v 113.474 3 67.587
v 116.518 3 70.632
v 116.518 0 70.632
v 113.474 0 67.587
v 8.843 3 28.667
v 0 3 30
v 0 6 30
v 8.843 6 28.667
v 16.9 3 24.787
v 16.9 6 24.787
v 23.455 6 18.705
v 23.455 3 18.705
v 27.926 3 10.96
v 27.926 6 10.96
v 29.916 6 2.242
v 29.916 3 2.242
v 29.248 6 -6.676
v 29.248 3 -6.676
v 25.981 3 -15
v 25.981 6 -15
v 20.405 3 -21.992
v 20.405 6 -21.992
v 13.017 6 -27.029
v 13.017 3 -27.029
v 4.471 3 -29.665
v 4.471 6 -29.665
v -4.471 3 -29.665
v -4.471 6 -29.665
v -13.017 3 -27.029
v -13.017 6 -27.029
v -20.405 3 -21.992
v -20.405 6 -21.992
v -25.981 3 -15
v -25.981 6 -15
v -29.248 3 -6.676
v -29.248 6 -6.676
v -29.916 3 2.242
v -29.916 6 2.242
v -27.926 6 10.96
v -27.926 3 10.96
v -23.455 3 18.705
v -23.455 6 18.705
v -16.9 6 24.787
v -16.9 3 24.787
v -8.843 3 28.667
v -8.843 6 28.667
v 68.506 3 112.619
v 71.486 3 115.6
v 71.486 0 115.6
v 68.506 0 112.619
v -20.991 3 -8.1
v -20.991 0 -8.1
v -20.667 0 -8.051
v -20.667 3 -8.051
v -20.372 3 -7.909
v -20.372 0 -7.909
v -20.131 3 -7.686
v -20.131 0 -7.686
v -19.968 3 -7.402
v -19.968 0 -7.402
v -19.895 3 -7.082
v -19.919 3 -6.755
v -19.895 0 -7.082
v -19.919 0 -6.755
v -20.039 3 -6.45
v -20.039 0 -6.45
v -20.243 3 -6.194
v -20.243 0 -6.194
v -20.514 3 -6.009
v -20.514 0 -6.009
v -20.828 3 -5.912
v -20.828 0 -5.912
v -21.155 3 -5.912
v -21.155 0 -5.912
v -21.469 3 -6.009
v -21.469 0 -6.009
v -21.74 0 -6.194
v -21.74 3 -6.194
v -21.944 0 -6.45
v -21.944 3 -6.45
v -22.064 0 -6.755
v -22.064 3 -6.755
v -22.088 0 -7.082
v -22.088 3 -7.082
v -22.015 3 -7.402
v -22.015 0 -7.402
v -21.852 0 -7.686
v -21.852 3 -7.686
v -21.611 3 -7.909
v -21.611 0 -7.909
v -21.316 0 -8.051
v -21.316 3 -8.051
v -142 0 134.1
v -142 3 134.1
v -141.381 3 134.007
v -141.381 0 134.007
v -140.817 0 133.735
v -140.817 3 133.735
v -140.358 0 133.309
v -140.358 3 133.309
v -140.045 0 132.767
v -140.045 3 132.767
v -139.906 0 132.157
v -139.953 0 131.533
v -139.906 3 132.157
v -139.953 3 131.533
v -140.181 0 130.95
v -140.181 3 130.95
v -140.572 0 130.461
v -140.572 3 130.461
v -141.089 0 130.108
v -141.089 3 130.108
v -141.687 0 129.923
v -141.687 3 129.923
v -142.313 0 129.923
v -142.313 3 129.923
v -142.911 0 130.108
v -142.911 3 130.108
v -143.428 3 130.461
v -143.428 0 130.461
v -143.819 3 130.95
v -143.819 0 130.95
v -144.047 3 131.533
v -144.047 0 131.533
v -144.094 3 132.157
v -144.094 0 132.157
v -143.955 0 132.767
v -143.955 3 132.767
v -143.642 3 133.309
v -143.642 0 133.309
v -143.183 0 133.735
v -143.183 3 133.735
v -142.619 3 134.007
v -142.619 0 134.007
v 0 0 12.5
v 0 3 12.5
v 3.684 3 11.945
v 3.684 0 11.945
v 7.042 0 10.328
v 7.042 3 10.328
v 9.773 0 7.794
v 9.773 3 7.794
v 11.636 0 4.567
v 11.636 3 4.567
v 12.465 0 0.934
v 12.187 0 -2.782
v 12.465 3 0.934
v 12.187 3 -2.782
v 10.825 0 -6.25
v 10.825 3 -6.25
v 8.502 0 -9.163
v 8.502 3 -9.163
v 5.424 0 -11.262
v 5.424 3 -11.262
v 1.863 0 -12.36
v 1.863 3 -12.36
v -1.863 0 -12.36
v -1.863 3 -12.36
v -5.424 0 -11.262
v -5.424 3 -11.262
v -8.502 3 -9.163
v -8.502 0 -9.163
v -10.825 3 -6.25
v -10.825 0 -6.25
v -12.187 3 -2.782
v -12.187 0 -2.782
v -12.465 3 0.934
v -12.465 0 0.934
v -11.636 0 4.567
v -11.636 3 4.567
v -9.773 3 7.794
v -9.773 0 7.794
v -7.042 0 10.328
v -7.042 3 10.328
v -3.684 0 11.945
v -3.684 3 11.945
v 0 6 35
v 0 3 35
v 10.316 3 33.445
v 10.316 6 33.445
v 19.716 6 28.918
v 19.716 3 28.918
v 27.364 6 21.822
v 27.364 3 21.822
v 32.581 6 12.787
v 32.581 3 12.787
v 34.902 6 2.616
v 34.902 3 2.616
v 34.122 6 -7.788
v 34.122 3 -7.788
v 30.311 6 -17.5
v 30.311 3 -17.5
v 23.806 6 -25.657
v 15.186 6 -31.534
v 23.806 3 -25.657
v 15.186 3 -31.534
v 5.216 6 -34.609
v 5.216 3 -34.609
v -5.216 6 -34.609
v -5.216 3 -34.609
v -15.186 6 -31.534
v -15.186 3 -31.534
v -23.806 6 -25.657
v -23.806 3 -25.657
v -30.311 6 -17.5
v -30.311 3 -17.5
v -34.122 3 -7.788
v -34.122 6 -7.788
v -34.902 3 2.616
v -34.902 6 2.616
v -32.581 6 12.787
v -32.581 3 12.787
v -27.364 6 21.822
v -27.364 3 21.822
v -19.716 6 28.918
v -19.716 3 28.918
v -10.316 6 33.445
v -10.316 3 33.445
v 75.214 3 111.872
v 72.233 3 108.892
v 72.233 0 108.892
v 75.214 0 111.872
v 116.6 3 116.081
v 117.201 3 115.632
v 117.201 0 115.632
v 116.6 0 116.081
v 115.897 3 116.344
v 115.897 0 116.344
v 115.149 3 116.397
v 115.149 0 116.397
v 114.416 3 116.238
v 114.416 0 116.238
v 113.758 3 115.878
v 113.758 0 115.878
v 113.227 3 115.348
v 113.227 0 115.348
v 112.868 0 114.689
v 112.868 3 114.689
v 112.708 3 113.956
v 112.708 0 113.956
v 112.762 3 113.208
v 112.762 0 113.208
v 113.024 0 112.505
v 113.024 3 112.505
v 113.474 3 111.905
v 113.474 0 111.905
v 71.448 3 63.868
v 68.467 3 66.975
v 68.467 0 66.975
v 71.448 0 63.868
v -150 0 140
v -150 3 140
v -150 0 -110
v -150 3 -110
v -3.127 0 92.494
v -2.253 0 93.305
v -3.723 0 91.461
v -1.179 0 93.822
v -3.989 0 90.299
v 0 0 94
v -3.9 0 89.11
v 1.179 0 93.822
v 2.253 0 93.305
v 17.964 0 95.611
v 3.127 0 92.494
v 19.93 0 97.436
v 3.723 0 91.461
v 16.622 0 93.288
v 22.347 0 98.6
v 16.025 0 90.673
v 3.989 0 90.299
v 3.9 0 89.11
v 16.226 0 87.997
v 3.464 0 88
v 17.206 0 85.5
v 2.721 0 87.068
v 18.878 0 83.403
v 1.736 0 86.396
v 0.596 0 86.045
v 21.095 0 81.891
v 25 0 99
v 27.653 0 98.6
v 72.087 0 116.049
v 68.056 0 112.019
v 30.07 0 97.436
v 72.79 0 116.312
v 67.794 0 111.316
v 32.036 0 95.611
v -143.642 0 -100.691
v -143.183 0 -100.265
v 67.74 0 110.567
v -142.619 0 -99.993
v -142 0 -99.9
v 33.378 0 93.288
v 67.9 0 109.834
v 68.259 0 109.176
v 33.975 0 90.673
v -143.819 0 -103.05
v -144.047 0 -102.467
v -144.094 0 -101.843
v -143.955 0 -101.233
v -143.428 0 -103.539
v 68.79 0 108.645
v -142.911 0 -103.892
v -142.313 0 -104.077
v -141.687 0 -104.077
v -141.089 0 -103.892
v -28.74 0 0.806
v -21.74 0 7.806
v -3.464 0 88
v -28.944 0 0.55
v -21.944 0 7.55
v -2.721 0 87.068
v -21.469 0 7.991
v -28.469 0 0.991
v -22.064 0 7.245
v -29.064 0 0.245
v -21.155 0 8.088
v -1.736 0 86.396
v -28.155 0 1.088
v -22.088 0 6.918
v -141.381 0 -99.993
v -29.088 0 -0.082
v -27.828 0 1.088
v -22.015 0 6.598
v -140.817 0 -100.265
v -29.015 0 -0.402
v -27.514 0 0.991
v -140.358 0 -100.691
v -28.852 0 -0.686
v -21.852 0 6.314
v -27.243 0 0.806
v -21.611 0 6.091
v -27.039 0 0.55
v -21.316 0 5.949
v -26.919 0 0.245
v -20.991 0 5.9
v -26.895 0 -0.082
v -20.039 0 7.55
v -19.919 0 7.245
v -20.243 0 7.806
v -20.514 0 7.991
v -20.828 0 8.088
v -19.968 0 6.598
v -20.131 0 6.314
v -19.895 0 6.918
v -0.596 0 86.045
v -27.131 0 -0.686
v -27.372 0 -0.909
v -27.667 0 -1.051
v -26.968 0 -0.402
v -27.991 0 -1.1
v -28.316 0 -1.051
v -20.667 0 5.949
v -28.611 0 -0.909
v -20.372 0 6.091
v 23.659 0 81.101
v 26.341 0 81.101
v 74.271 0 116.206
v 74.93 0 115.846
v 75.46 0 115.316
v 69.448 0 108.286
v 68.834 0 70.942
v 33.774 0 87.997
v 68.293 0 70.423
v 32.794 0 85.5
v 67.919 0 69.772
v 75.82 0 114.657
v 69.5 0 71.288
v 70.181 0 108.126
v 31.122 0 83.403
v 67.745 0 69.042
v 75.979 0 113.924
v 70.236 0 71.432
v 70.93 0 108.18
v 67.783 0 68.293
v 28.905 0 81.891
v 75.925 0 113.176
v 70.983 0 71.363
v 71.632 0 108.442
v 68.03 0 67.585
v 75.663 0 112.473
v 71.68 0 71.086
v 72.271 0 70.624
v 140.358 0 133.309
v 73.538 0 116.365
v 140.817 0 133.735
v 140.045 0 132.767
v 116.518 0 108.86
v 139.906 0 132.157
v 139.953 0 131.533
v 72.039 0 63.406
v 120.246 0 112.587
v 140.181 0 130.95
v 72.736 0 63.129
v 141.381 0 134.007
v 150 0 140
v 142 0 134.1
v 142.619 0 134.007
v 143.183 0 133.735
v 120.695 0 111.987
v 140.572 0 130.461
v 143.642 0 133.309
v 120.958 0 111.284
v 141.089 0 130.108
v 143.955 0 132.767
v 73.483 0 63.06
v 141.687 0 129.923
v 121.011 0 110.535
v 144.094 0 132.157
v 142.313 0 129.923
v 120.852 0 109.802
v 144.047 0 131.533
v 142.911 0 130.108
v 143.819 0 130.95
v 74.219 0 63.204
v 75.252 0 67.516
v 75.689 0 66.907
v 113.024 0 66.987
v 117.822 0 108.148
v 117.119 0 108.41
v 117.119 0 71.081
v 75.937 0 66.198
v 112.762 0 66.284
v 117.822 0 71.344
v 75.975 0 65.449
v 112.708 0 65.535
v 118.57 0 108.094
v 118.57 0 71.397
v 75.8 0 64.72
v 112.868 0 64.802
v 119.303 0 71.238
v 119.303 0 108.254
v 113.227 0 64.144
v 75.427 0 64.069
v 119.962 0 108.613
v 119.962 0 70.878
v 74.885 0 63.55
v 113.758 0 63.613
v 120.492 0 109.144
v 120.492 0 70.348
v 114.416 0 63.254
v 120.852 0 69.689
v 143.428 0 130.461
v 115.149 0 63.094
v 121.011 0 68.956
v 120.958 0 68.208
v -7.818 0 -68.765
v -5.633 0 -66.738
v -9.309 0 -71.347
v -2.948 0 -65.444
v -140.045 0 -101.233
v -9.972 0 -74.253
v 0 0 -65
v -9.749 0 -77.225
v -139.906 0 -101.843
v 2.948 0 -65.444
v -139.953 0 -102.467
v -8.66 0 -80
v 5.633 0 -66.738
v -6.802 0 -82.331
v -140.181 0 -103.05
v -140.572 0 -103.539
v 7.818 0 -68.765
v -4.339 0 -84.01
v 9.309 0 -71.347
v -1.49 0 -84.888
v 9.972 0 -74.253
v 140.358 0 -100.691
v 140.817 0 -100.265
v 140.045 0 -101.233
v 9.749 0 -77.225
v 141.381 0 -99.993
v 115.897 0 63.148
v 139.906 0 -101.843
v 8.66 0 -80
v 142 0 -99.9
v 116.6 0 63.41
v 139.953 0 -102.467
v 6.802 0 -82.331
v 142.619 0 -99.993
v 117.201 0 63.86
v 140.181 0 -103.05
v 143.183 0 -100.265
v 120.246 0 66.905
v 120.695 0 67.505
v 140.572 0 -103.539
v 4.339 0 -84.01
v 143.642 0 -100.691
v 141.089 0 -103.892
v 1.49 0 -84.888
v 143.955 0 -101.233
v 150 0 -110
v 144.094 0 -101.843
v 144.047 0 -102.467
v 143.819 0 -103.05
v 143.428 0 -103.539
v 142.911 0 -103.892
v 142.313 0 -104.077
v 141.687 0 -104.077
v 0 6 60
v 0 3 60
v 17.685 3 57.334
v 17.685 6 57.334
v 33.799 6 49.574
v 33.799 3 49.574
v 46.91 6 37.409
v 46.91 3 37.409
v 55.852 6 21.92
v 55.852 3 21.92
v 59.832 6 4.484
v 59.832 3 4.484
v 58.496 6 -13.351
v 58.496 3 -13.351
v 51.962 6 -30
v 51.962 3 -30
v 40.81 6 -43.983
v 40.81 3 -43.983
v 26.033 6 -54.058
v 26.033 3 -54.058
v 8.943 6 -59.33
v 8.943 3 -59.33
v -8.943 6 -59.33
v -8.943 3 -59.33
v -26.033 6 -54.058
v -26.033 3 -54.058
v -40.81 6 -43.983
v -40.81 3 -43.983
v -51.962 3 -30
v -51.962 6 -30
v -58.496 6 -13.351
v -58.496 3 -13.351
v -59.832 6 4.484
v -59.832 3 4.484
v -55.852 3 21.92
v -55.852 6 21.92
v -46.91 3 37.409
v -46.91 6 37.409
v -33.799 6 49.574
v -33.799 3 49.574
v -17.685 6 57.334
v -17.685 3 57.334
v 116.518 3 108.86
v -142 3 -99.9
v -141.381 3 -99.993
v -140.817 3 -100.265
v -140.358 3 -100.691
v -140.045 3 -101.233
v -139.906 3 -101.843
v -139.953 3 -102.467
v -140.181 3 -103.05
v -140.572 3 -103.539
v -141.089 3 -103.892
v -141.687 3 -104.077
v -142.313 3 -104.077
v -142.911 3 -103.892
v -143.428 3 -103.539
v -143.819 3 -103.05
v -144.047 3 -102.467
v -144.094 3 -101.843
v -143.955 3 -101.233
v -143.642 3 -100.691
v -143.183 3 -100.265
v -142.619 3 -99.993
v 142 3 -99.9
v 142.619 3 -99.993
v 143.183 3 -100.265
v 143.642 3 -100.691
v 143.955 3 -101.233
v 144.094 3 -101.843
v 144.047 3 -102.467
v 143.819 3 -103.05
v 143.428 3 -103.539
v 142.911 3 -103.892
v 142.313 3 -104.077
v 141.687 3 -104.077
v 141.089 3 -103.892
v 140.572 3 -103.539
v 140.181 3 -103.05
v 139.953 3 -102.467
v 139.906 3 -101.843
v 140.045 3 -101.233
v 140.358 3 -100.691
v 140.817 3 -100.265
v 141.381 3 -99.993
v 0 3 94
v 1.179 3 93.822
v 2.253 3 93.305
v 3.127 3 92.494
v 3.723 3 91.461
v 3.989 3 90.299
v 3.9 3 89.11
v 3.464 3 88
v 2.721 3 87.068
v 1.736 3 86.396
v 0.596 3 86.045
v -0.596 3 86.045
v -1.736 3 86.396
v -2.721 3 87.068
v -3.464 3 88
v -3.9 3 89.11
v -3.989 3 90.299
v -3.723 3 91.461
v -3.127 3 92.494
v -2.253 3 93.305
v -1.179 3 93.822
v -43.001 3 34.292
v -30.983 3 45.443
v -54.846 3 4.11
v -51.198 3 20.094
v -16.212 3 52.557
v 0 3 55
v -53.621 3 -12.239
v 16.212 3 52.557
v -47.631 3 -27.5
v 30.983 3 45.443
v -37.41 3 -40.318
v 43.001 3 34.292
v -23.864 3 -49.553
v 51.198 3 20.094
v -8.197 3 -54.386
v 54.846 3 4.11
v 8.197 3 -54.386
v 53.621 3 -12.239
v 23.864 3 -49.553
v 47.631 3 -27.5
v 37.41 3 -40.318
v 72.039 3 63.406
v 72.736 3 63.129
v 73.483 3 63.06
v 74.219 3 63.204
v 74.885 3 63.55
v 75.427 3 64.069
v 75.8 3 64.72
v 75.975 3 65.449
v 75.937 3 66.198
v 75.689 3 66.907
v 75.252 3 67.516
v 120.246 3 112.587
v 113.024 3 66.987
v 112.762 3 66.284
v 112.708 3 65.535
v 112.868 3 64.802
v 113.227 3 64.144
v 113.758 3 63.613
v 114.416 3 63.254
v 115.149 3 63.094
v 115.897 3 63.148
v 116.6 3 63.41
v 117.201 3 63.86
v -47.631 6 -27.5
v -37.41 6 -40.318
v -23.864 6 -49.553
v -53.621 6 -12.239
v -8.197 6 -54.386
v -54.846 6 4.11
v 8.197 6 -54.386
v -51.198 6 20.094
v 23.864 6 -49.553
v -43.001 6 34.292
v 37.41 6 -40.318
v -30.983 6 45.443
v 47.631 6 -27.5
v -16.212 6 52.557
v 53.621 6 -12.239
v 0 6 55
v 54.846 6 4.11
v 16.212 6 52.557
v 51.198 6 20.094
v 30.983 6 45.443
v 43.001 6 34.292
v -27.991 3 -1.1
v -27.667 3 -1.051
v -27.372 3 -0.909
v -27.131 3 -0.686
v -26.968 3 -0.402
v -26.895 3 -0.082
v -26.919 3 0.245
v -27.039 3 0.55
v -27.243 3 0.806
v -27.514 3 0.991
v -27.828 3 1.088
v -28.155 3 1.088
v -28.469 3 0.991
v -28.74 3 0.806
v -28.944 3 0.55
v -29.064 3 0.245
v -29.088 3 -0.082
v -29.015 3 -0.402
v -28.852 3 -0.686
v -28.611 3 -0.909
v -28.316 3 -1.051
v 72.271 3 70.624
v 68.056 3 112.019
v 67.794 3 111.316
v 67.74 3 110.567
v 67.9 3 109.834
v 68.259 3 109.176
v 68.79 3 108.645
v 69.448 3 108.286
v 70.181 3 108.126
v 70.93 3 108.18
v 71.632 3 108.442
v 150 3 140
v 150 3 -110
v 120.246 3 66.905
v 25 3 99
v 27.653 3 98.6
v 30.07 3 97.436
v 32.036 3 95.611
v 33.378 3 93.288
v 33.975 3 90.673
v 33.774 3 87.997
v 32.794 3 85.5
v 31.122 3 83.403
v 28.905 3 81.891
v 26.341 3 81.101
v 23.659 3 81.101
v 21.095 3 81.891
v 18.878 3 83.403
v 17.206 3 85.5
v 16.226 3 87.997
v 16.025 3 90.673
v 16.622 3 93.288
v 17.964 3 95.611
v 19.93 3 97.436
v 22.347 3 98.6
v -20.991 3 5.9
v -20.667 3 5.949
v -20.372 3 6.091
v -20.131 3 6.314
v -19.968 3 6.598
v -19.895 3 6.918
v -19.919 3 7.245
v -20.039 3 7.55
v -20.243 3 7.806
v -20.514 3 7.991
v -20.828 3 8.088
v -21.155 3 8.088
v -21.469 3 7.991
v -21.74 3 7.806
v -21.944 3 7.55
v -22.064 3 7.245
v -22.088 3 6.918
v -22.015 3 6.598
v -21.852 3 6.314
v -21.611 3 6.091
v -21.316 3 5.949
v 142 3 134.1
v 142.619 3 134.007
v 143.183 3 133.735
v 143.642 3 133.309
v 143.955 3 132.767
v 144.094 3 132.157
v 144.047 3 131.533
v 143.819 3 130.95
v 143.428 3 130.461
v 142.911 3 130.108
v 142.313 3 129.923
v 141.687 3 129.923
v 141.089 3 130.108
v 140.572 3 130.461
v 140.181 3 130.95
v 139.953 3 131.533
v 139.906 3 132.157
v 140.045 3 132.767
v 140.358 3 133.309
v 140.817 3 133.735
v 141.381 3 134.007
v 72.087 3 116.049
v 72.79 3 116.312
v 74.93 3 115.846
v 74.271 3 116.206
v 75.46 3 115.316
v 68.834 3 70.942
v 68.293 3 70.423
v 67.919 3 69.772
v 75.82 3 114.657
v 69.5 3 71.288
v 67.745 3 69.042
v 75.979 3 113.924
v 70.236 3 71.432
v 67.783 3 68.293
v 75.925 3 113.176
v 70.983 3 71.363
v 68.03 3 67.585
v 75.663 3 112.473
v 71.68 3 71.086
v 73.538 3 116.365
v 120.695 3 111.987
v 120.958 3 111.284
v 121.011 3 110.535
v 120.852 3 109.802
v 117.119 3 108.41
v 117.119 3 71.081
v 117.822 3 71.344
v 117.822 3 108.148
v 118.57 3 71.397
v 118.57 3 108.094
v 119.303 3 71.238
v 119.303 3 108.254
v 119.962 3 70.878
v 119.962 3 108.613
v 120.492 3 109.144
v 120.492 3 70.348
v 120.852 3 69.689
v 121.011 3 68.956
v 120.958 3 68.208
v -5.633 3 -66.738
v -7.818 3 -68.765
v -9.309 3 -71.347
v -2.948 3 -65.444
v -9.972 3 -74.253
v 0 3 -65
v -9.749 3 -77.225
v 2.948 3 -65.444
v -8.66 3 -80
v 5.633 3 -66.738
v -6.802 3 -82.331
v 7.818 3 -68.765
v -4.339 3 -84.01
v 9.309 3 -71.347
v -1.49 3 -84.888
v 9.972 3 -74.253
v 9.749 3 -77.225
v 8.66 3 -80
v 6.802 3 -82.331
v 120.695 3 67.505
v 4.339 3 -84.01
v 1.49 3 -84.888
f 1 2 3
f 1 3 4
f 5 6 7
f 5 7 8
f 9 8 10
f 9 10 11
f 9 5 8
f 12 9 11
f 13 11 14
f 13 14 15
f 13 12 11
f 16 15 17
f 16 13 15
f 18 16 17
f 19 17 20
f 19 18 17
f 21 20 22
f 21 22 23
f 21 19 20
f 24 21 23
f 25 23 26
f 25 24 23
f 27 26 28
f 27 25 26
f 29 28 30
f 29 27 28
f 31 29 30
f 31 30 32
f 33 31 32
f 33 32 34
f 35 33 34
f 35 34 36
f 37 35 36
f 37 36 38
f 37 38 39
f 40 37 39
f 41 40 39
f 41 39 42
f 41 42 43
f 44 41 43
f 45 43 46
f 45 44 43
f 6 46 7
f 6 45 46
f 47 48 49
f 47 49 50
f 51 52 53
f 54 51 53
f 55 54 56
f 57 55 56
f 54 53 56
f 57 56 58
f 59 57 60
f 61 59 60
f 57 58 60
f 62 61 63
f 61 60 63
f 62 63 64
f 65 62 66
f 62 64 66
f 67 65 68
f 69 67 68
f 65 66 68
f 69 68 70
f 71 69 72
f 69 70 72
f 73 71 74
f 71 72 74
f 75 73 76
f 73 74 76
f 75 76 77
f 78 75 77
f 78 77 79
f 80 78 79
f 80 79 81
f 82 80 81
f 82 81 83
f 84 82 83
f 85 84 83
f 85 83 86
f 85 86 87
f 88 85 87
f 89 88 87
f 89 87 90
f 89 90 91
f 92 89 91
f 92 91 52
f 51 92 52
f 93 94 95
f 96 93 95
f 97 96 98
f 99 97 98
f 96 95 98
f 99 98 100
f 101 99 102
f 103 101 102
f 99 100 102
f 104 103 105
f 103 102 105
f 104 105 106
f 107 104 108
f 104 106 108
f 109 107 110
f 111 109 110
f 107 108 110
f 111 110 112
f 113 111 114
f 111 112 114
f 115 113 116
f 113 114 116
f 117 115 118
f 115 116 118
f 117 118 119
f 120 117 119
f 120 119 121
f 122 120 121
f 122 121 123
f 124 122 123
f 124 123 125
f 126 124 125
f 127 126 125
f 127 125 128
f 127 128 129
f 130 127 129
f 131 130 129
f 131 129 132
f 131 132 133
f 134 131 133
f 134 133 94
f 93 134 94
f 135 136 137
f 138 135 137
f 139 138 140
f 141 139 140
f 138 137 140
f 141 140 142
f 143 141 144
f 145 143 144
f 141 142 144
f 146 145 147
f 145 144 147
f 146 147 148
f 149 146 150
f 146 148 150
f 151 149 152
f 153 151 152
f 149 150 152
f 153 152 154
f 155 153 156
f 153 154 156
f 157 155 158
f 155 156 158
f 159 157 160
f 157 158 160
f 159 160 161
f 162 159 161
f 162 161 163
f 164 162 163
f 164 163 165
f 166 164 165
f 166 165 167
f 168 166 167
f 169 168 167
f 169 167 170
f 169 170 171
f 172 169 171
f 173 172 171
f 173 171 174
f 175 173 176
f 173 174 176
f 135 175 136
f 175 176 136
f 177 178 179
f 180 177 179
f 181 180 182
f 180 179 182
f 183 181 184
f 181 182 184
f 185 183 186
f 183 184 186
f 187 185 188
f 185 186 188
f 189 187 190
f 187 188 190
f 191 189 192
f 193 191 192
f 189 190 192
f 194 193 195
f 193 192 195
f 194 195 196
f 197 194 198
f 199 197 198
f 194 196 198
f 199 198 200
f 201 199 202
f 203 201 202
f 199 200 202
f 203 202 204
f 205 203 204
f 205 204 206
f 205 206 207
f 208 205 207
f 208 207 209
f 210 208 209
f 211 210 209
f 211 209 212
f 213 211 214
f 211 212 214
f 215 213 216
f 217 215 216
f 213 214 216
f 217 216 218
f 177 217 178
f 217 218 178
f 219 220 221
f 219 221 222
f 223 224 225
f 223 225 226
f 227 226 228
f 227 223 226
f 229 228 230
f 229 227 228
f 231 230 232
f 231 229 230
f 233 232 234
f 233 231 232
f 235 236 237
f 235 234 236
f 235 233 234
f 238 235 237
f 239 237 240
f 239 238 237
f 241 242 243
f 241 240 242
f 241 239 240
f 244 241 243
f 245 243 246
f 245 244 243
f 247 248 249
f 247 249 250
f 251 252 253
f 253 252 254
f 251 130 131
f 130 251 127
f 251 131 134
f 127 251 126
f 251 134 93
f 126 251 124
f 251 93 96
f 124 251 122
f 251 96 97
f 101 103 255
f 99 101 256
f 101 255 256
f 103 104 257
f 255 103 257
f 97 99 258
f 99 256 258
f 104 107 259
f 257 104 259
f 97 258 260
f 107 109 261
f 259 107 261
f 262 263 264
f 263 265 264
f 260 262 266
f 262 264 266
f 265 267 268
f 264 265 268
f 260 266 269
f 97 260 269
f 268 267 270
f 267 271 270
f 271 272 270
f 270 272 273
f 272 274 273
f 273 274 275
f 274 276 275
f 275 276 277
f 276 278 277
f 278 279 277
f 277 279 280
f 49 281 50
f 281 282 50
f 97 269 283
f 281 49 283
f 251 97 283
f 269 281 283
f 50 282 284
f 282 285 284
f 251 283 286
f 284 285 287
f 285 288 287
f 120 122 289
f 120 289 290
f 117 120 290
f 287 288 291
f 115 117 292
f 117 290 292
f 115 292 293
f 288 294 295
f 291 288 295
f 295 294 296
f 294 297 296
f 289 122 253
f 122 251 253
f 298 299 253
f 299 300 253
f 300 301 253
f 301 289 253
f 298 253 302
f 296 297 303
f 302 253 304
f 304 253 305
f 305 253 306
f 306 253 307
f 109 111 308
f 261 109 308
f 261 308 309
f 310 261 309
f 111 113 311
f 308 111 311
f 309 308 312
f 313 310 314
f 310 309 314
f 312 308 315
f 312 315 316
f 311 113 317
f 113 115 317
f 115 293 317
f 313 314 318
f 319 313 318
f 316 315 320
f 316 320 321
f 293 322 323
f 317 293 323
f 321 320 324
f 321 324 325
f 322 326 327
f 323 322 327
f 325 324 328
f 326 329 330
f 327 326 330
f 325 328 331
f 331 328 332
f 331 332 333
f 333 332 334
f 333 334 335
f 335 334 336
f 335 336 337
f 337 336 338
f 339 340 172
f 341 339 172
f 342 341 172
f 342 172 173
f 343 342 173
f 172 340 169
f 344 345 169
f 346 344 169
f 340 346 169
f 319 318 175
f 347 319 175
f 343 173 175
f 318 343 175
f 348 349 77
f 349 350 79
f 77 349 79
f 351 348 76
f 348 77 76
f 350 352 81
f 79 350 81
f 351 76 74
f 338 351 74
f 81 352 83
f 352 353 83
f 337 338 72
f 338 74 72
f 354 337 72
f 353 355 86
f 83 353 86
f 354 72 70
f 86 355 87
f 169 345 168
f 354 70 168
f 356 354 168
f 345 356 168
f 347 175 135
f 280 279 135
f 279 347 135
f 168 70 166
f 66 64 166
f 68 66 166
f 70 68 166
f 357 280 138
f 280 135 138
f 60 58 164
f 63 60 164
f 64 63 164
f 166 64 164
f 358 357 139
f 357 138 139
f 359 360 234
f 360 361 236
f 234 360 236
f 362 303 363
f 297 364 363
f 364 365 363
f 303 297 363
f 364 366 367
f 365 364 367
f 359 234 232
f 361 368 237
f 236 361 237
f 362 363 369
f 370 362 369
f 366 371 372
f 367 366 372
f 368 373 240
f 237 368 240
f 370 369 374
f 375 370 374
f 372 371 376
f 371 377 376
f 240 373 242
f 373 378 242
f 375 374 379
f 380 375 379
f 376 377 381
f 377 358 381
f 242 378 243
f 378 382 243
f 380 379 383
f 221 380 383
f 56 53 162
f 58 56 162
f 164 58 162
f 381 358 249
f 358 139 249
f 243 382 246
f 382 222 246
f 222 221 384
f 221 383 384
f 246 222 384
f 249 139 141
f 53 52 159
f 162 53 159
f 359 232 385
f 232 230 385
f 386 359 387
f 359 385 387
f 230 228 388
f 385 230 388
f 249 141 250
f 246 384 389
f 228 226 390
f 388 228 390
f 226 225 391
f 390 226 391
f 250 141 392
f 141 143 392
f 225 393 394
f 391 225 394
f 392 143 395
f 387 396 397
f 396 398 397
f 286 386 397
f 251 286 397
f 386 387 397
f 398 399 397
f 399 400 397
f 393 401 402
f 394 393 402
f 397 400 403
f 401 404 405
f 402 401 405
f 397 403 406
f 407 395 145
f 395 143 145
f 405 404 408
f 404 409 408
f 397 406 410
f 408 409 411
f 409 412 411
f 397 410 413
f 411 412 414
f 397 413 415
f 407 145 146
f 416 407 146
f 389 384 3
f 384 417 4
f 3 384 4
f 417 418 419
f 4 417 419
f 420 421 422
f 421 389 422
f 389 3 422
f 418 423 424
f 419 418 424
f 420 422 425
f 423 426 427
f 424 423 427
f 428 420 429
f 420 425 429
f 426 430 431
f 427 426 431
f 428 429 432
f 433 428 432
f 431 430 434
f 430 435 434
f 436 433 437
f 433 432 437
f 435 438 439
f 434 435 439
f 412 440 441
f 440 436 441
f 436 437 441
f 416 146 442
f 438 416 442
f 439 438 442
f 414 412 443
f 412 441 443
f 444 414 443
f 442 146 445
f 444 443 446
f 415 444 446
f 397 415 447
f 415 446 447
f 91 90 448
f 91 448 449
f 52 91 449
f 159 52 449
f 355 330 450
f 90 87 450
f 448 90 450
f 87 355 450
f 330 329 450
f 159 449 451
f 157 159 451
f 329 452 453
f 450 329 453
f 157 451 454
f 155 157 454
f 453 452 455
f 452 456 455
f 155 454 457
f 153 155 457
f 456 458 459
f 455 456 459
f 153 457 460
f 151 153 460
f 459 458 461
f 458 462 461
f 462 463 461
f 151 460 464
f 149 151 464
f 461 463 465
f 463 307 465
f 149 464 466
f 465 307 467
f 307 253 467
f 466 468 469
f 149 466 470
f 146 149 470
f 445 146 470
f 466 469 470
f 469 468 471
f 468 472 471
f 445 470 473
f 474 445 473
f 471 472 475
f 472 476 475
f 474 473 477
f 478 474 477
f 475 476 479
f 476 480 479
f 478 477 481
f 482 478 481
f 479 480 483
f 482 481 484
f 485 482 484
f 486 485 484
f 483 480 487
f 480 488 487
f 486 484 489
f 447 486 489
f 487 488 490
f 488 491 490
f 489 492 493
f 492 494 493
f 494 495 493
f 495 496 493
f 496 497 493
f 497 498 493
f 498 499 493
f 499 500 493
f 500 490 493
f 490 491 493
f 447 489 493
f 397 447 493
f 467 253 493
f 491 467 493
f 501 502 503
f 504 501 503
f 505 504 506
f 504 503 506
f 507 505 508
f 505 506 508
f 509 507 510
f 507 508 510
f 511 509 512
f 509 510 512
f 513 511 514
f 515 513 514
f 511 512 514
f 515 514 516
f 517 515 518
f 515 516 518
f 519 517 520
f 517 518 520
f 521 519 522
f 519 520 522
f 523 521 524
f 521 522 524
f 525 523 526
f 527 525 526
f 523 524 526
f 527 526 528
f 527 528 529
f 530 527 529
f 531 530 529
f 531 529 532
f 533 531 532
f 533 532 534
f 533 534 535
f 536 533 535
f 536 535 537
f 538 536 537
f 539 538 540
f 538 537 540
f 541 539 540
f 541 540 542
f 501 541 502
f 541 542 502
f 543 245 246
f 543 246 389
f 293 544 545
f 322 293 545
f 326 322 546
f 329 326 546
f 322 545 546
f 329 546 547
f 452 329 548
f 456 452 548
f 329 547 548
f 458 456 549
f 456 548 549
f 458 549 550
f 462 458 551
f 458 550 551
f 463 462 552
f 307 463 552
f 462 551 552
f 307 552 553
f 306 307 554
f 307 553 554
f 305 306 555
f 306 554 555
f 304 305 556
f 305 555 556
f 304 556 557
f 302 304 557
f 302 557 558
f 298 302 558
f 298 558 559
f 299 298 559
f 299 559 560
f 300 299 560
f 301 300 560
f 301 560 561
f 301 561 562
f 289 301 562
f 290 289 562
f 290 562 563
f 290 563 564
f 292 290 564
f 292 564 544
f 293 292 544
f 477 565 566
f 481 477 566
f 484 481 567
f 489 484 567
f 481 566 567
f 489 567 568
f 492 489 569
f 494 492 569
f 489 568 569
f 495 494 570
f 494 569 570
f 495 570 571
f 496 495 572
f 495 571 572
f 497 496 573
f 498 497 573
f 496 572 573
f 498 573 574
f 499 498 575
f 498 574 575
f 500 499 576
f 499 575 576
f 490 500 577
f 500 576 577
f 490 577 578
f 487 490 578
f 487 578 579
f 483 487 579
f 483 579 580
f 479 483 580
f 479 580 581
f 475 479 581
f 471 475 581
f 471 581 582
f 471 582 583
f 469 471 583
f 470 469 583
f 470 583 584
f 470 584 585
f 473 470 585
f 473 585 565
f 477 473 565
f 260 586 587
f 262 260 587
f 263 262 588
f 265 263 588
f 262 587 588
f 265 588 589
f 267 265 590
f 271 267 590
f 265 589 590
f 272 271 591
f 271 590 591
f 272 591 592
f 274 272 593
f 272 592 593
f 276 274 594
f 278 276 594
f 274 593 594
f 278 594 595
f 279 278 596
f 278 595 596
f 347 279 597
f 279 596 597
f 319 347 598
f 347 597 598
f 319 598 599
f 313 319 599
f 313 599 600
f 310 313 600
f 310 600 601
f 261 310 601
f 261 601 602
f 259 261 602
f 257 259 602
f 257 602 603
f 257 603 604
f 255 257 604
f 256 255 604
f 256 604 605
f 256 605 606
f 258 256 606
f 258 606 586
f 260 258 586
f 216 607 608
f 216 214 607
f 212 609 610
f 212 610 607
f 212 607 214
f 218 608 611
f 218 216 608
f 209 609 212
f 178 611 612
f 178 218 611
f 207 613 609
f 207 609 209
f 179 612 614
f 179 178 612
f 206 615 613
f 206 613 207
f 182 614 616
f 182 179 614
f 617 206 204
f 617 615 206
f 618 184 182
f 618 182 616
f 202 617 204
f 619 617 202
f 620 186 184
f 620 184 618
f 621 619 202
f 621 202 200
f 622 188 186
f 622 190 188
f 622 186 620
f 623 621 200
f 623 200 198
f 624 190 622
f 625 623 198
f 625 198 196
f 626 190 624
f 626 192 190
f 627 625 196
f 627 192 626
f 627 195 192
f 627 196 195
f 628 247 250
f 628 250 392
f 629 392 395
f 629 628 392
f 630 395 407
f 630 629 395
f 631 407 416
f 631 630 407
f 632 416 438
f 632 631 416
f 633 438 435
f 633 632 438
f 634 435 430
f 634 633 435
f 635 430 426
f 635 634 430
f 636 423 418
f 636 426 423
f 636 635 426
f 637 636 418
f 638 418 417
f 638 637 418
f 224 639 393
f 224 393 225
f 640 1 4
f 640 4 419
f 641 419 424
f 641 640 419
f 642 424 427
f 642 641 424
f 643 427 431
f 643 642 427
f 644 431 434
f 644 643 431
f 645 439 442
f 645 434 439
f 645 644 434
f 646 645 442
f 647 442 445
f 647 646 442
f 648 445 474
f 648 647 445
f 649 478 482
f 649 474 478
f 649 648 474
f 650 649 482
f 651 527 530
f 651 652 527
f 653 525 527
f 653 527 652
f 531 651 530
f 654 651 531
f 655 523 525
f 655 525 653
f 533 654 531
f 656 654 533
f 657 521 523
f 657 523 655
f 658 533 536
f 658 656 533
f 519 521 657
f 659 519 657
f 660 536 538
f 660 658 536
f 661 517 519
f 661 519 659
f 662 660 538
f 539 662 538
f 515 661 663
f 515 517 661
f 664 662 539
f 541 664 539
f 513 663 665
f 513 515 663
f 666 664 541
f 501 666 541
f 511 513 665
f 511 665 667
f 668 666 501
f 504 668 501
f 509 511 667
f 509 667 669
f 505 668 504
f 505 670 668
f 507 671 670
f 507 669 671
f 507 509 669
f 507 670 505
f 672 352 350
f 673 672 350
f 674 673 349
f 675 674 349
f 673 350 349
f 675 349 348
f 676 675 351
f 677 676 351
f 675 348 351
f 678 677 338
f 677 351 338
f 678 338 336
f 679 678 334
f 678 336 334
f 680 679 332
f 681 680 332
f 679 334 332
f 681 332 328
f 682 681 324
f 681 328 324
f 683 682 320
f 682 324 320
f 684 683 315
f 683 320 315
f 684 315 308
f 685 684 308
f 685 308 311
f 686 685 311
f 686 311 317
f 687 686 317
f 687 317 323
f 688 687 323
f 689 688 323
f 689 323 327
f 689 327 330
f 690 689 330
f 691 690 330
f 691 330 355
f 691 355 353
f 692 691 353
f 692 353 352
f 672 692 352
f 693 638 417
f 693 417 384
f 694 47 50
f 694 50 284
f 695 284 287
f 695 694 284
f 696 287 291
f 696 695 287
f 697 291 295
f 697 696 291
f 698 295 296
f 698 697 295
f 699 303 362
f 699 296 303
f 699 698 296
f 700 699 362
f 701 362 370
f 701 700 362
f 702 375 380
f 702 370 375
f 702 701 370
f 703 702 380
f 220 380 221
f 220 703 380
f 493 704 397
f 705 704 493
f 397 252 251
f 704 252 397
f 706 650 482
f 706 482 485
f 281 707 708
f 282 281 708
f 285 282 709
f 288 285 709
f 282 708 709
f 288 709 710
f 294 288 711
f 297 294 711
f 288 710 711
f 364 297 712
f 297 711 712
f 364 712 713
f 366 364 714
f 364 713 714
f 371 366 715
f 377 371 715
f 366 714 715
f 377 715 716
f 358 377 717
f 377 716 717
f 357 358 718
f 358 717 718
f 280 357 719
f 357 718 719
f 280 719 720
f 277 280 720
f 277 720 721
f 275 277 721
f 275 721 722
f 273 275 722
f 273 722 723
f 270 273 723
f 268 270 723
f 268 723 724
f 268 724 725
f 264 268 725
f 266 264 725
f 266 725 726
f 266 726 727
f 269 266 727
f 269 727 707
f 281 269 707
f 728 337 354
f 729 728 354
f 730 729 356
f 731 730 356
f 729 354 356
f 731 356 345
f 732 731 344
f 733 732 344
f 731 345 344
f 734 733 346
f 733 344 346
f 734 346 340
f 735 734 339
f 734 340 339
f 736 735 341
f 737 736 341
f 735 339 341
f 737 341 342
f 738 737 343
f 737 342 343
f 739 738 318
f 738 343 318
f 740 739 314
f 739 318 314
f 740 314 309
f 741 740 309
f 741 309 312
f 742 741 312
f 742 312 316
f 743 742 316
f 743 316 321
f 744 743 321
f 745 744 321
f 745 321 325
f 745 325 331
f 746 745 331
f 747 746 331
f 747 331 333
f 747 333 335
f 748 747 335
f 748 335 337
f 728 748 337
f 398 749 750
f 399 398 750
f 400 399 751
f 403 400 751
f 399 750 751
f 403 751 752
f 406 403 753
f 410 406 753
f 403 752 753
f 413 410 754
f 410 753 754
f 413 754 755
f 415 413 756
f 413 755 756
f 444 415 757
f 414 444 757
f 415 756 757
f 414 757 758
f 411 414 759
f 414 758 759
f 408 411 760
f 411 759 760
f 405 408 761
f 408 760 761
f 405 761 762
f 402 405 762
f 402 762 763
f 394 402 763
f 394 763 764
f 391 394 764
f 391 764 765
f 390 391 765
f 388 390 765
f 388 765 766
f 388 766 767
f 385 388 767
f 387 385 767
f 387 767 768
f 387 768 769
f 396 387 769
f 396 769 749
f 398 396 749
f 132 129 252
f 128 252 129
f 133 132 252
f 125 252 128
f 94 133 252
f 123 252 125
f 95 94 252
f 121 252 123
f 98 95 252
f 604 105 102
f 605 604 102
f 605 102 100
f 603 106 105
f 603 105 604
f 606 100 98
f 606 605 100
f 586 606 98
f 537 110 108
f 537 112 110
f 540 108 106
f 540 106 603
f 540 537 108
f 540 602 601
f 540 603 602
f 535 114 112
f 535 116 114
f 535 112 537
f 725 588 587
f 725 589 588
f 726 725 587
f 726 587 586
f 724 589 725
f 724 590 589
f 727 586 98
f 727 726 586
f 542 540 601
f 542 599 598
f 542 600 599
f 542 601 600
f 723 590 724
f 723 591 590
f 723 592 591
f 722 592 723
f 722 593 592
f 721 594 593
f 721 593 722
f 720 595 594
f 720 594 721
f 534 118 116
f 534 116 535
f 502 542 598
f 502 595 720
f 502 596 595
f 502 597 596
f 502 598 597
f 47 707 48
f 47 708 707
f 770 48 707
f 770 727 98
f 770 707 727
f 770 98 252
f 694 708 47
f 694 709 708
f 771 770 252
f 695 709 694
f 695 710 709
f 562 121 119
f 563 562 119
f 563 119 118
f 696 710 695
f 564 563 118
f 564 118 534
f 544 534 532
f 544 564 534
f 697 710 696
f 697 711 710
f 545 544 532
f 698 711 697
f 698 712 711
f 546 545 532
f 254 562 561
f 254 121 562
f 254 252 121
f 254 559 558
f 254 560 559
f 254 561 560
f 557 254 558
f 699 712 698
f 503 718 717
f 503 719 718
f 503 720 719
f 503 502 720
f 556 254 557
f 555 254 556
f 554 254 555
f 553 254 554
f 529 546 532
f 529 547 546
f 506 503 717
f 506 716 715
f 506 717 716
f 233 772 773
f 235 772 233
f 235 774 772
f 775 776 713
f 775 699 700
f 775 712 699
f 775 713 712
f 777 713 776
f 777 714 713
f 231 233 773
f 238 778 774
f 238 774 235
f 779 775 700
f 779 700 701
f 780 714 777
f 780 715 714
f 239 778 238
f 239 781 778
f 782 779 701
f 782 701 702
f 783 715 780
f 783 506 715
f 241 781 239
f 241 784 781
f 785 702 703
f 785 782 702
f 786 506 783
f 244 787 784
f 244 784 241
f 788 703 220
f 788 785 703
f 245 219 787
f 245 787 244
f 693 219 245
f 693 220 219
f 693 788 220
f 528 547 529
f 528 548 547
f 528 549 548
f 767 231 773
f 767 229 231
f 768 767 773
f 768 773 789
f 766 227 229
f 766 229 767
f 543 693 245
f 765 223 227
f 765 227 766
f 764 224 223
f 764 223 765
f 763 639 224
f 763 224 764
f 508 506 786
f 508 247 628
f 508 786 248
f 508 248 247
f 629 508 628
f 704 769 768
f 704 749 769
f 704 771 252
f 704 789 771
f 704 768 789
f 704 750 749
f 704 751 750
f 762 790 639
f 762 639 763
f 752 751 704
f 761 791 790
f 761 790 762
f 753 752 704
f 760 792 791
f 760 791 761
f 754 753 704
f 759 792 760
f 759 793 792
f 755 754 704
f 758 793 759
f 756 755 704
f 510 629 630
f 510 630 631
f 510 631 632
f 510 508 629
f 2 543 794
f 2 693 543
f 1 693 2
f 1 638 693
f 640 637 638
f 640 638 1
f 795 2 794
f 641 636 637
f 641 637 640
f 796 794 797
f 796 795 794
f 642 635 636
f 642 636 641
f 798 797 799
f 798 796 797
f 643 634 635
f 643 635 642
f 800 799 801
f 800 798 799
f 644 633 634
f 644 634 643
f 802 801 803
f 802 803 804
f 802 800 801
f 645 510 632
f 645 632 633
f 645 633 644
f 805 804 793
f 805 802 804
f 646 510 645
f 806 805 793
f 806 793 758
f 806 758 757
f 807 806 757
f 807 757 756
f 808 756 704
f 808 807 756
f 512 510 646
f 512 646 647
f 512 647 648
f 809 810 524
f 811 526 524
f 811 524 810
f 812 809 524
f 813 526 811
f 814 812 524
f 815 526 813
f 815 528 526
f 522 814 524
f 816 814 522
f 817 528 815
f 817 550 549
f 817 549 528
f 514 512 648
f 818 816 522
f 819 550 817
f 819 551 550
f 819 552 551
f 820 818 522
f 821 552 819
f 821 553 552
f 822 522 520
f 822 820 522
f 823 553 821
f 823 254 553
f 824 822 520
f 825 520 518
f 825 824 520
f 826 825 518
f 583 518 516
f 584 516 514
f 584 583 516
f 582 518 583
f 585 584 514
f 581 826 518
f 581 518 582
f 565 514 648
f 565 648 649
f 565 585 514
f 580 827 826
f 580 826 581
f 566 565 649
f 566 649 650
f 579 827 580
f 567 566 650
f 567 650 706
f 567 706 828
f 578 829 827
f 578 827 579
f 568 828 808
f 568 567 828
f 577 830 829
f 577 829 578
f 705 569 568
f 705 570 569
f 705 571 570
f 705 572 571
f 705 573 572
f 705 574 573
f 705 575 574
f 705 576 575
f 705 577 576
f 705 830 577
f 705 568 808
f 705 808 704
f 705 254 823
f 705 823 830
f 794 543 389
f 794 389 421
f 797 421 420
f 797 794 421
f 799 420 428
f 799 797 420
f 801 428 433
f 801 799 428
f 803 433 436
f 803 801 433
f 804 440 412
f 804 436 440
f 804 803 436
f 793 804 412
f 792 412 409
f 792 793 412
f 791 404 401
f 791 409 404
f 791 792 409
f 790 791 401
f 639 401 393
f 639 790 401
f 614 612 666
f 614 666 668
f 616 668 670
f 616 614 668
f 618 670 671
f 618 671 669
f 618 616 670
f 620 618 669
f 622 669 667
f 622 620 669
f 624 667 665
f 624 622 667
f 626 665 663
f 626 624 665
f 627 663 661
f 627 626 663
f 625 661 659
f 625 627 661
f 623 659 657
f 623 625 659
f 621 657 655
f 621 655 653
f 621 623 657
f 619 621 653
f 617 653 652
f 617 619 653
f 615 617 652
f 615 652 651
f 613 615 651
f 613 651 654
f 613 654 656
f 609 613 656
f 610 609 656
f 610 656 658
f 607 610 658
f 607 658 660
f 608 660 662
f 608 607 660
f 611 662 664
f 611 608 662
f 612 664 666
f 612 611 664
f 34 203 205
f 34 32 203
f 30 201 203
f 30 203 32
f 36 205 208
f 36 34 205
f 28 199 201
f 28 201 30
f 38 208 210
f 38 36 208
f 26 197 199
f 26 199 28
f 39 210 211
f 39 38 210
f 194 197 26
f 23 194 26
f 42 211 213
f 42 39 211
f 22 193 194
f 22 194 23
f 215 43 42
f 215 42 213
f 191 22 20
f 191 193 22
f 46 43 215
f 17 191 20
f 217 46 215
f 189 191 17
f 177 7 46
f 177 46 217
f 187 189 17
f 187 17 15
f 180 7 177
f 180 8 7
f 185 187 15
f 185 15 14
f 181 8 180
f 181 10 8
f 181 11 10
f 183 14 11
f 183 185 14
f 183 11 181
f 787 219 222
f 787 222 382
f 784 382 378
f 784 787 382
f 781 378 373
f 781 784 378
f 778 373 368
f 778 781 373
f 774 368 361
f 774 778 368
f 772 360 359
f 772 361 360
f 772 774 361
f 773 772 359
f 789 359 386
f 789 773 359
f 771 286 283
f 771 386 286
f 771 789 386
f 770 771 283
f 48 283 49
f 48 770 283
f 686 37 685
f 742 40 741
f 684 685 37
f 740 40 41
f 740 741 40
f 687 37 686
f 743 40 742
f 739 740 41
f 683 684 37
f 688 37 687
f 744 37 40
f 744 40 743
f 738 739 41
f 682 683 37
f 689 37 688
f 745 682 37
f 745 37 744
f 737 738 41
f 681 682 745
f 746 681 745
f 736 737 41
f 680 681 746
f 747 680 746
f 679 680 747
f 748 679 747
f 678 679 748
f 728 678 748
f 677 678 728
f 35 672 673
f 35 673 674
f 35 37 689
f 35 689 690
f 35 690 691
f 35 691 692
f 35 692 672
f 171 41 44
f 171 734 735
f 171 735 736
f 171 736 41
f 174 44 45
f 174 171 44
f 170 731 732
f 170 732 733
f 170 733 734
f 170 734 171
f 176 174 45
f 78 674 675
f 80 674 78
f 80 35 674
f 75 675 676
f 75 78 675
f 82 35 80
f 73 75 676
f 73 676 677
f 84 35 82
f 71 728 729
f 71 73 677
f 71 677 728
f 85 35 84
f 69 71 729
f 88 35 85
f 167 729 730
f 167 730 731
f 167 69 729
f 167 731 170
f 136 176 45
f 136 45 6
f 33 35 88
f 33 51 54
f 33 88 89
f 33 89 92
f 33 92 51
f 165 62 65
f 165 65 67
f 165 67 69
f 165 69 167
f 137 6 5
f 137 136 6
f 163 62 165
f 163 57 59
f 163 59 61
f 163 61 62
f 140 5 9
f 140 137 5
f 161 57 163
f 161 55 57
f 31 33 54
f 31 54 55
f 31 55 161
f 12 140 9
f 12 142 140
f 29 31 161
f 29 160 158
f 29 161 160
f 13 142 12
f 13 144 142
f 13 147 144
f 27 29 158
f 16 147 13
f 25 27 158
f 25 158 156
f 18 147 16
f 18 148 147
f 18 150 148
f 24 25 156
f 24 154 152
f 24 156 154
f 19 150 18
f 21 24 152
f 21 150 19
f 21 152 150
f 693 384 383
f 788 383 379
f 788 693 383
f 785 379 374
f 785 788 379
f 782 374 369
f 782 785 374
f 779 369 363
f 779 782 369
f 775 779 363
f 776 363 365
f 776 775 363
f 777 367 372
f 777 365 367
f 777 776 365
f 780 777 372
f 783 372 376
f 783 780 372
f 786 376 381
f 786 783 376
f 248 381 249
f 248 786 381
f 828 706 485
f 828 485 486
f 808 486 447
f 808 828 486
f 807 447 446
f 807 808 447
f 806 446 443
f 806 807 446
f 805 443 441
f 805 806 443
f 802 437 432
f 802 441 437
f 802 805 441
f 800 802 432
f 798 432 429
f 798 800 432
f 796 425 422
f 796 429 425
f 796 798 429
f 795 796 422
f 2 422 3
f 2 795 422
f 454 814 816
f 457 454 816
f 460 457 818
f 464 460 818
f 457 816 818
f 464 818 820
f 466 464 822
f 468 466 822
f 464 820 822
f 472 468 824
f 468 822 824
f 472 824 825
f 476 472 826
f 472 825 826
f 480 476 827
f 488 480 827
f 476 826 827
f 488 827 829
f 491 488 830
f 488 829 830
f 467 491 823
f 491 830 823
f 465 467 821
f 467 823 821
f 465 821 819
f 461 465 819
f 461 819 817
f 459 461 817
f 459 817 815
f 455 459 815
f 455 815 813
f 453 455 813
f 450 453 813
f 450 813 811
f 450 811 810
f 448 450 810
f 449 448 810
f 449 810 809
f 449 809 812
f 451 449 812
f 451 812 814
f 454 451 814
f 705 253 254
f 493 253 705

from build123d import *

# Parameters (mm, degrees)
SKETCH1_W           = 300
SKETCH1_H           = 220
BOSS_EXTRUDE1_DEPTH = 3
SKETCH2_R           = 12.5
CUT_EXTRUDE1_DEPTH  = 3
SKETCH3_R           = 60
SKETCH3_R_2         = 55
SKETCH3_R_3         = 35
SKETCH3_R_4         = 30
BOSS_EXTRUDE2_DEPTH = 3
CUT_EXTRUDE2_REACH  = 188.107
SKETCH4_R           = 1.1
CUT_EXTRUDE3_REACH  = 188.035
SKETCH5_R           = 10
SKETCH6_W           = 300
SKETCH6_H           = 30
BOSS_EXTRUDE3_DEPTH = 3
CUT_EXTRUDE4_REACH  = 207.205
SKETCH7_R           = 2.1
CUT_EXTRUDE5_REACH  = 207.205
CUT_EXTRUDE6_REACH  = 207.205
SKETCH10_R          = 4
SKETCH10_R_2        = 9


with BuildPart() as part:
    # Sketch1 → Boss-Extrude1 (new body)
    with BuildSketch(Plane(origin=(0, 0, 0), x_dir=(1, 0, 0), z_dir=(0, 1, 0))):
        Rectangle(SKETCH1_W, SKETCH1_H)
    extrude(amount=BOSS_EXTRUDE1_DEPTH)

    # Sketch2 → Cut-Extrude1 (cut)
    with BuildSketch(Plane(origin=(0, 3, 0), x_dir=(1, 0, 0), z_dir=(0, 1, 0))):
        with Locations(Location((0, 0, 0), (0, 0, 270))):
            Circle(SKETCH2_R)
    extrude(amount=-CUT_EXTRUDE1_DEPTH, mode=Mode.SUBTRACT)

    # Sketch3 → Boss-Extrude2 (add)
    # profile 1 of 2: a face of its own
    with BuildSketch(Plane(origin=(0, 3, 0), x_dir=(1, 0, 0), z_dir=(0, 1, 0))):
        with Locations(Location((0, 0, 0), (0, 0, 270))):
            Circle(SKETCH3_R)
        with Locations(Location((0, 0, 0), (0, 0, 270))):
            Circle(SKETCH3_R_2, mode=Mode.SUBTRACT)
    # profile 2 of 2: a face of its own
    with BuildSketch(Plane(origin=(0, 3, 0), x_dir=(1, 0, 0), z_dir=(0, 1, 0))):
        with Locations(Location((0, 0, 0), (0, 0, 270))):
            Circle(SKETCH3_R_3)
        with Locations(Location((0, 0, 0), (0, 0, 270))):
            Circle(SKETCH3_R_4, mode=Mode.SUBTRACT)
    extrude(amount=BOSS_EXTRUDE2_DEPTH)

    # Sketch4 → Cut-Extrude2 (cut, up to next)
    with BuildSketch(Plane.XZ, mode=Mode.PRIVATE) as cut_extrude2_sk1:
        with Locations(Location((-20.991491193, 7, 0), (0, 0, 270))):
            Circle(SKETCH4_R)
    cut_extrude2_tool1 = extrude(cut_extrude2_sk1.sketch, amount=-CUT_EXTRUDE2_REACH, mode=Mode.PRIVATE) & part.part
    # Sketch4 → Cut-Extrude2 (cut, up to next)
    with BuildSketch(Plane.XZ, mode=Mode.PRIVATE) as cut_extrude2_sk2:
        with Locations(Location((-27.991491193, 0, 0), (0, 0, 270))):
            Circle(SKETCH4_R)
    cut_extrude2_tool2 = extrude(cut_extrude2_sk2.sketch, amount=-CUT_EXTRUDE2_REACH, mode=Mode.PRIVATE) & part.part
    # Sketch4 → Cut-Extrude2 (cut, up to next)
    with BuildSketch(Plane.XZ, mode=Mode.PRIVATE) as cut_extrude2_sk3:
        with Locations(Location((-20.991491193, -7, 0), (0, 0, 270))):
            Circle(SKETCH4_R)
    cut_extrude2_tool3 = extrude(cut_extrude2_sk3.sketch, amount=-CUT_EXTRUDE2_REACH, mode=Mode.PRIVATE) & part.part
    add(cut_extrude2_tool1.solids().sort_by_distance((-20.991491, 0, 7))[0], mode=Mode.SUBTRACT)
    add(cut_extrude2_tool2.solids().sort_by_distance((-27.991491, 0, 0))[0], mode=Mode.SUBTRACT)
    add(cut_extrude2_tool3.solids().sort_by_distance((-20.991491, 0, -7))[0], mode=Mode.SUBTRACT)

    # Sketch5 → Cut-Extrude3 (cut, up to next)
    with BuildSketch(Plane(origin=(0, 3, 0), x_dir=(1, 0, 0), z_dir=(0, 1, 0)), mode=Mode.PRIVATE) as cut_extrude3_sk1:
        with Locations(Location((0, 75, 0), (0, 0, 270))):
            Circle(SKETCH5_R)
    cut_extrude3_tool1 = extrude(cut_extrude3_sk1.sketch, amount=-CUT_EXTRUDE3_REACH, mode=Mode.PRIVATE) & part.part
    add(cut_extrude3_tool1.solids().sort_by_distance((0, 3, -75))[0], mode=Mode.SUBTRACT)

    # Sketch6 → Boss-Extrude3 (add)
    with BuildSketch(Plane(origin=(0, 3, 0), x_dir=(1, 0, 0), z_dir=(0, 1, 0))):
        with Locations((0, -125)):
            Rectangle(SKETCH6_W, SKETCH6_H)
    extrude(amount=-BOSS_EXTRUDE3_DEPTH)

    # Sketch7 → Cut-Extrude4 (cut, up to next)
    with BuildSketch(Plane(origin=(0, 3, 0), x_dir=(1, 0, 0), z_dir=(0, 1, 0)), mode=Mode.PRIVATE) as cut_extrude4_sk1:
        with Locations(Location((-142, 102, 0), (0, 0, 270))):
            Circle(SKETCH7_R)
    cut_extrude4_tool1 = extrude(cut_extrude4_sk1.sketch, amount=-CUT_EXTRUDE4_REACH, mode=Mode.PRIVATE) & part.part
    # Sketch7 → Cut-Extrude4 (cut, up to next)
    with BuildSketch(Plane(origin=(0, 3, 0), x_dir=(1, 0, 0), z_dir=(0, 1, 0)), mode=Mode.PRIVATE) as cut_extrude4_sk2:
        with Locations(Location((142, 102, 0), (0, 0, 270))):
            Circle(SKETCH7_R)
    cut_extrude4_tool2 = extrude(cut_extrude4_sk2.sketch, amount=-CUT_EXTRUDE4_REACH, mode=Mode.PRIVATE) & part.part
    # Sketch7 → Cut-Extrude4 (cut, up to next)
    with BuildSketch(Plane(origin=(0, 3, 0), x_dir=(1, 0, 0), z_dir=(0, 1, 0)), mode=Mode.PRIVATE) as cut_extrude4_sk3:
        with Locations(Location((142, -132, 0), (0, 0, 270))):
            Circle(SKETCH7_R)
    cut_extrude4_tool3 = extrude(cut_extrude4_sk3.sketch, amount=-CUT_EXTRUDE4_REACH, mode=Mode.PRIVATE) & part.part
    # Sketch7 → Cut-Extrude4 (cut, up to next)
    with BuildSketch(Plane(origin=(0, 3, 0), x_dir=(1, 0, 0), z_dir=(0, 1, 0)), mode=Mode.PRIVATE) as cut_extrude4_sk4:
        with Locations(Location((-142, -132, 0), (0, 0, 270))):
            Circle(SKETCH7_R)
    cut_extrude4_tool4 = extrude(cut_extrude4_sk4.sketch, amount=-CUT_EXTRUDE4_REACH, mode=Mode.PRIVATE) & part.part
    add(cut_extrude4_tool1.solids().sort_by_distance((-142, 3, -102))[0], mode=Mode.SUBTRACT)
    add(cut_extrude4_tool2.solids().sort_by_distance((142, 3, -102))[0], mode=Mode.SUBTRACT)
    add(cut_extrude4_tool3.solids().sort_by_distance((142, 3, 132))[0], mode=Mode.SUBTRACT)
    add(cut_extrude4_tool4.solids().sort_by_distance((-142, 3, 132))[0], mode=Mode.SUBTRACT)

    # Sketch9 → Cut-Extrude5 (cut, up to next)
    with BuildSketch(Plane(origin=(0, 3, 0), x_dir=(1, 0, 0), z_dir=(0, 1, 0)), mode=Mode.PRIVATE) as cut_extrude5_sk1:
        with BuildLine():
            Line((75.252149951, -67.516466644), (72.271396026, -70.624077628))
            ThreePointArc((72.271396026, -70.624077628), (68.544792703, -70.701725066), (68.467145265, -66.975121742))
            Line((68.467145265, -66.975121742), (71.44789919, -63.867510758))
            ThreePointArc((71.44789919, -63.867510758), (75.174502513, -63.78986332), (75.252149951, -67.516466644))
        make_face()
    cut_extrude5_tool1 = extrude(cut_extrude5_sk1.sketch, amount=-CUT_EXTRUDE5_REACH, mode=Mode.PRIVATE) & part.part
    # Sketch9 → Cut-Extrude5 (cut, up to next)
    with BuildSketch(Plane(origin=(0, 3, 0), x_dir=(1, 0, 0), z_dir=(0, 1, 0)), mode=Mode.PRIVATE) as cut_extrude5_sk2:
        with BuildLine():
            Line((72.232976728, -108.891711148), (75.213730653, -111.872465073))
            ThreePointArc((75.213730653, -111.872465073), (75.213730653, -115.599877238), (71.486318487, -115.599877238))
            Line((71.486318487, -115.599877238), (68.505564562, -112.619123313))
            ThreePointArc((68.505564562, -112.619123313), (68.505564562, -108.891711148), (72.232976728, -108.891711148))
        make_face()
    cut_extrude5_tool2 = extrude(cut_extrude5_sk2.sketch, amount=-CUT_EXTRUDE5_REACH, mode=Mode.PRIVATE) & part.part
    # Sketch9 → Cut-Extrude5 (cut, up to next)
    with BuildSketch(Plane(origin=(0, 3, 0), x_dir=(1, 0, 0), z_dir=(0, 1, 0)), mode=Mode.PRIVATE) as cut_extrude5_sk3:
        with BuildLine():
            Line((120.245775281, -112.587078686), (117.2009321, -115.631921866))
            ThreePointArc((117.2009321, -115.631921866), (113.473519935, -115.631921866), (113.473519935, -111.9045097))
            Line((113.473519935, -111.9045097), (116.518363115, -108.85966652))
            ThreePointArc((116.518363115, -108.85966652), (120.245775281, -108.85966652), (120.245775281, -112.587078686))
        make_face()
    cut_extrude5_tool3 = extrude(cut_extrude5_sk3.sketch, amount=-CUT_EXTRUDE5_REACH, mode=Mode.PRIVATE) & part.part
    # Sketch9 → Cut-Extrude5 (cut, up to next)
    with BuildSketch(Plane(origin=(0, 3, 0), x_dir=(1, 0, 0), z_dir=(0, 1, 0)), mode=Mode.PRIVATE) as cut_extrude5_sk4:
        with BuildLine():
            Line((117.2009321, -63.85966652), (120.245775281, -66.9045097))
            ThreePointArc((120.245775281, -66.9045097), (120.245775281, -70.631921866), (116.518363115, -70.631921866))
            Line((116.518363115, -70.631921866), (113.473519935, -67.587078686))
            ThreePointArc((113.473519935, -67.587078686), (113.473519935, -63.85966652), (117.2009321, -63.85966652))
        make_face()
    cut_extrude5_tool4 = extrude(cut_extrude5_sk4.sketch, amount=-CUT_EXTRUDE5_REACH, mode=Mode.PRIVATE) & part.part
    add(cut_extrude5_tool1.solids().sort_by_distance((71.859648, 3, 67.245794))[0], mode=Mode.SUBTRACT)
    add(cut_extrude5_tool2.solids().sort_by_distance((71.859648, 3, 112.245794))[0], mode=Mode.SUBTRACT)
    add(cut_extrude5_tool3.solids().sort_by_distance((116.859648, 3, 112.245794))[0], mode=Mode.SUBTRACT)
    add(cut_extrude5_tool4.solids().sort_by_distance((116.859648, 3, 67.245794))[0], mode=Mode.SUBTRACT)

    # Sketch10 → Cut-Extrude6 (cut, up to next)
    with BuildSketch(Plane(origin=(0, 3, 0), x_dir=(1, 0, 0), z_dir=(0, 1, 0)), mode=Mode.PRIVATE) as cut_extrude6_sk1:
        with Locations(Location((0, -90, 0), (0, 0, 270))):
            Circle(SKETCH10_R)
    cut_extrude6_tool1 = extrude(cut_extrude6_sk1.sketch, amount=-CUT_EXTRUDE6_REACH, mode=Mode.PRIVATE) & part.part
    # Sketch10 → Cut-Extrude6 (cut, up to next)
    with BuildSketch(Plane(origin=(0, 3, 0), x_dir=(1, 0, 0), z_dir=(0, 1, 0)), mode=Mode.PRIVATE) as cut_extrude6_sk2:
        with Locations(Location((25, -90, 0), (0, 0, 270))):
            Circle(SKETCH10_R_2)
    cut_extrude6_tool2 = extrude(cut_extrude6_sk2.sketch, amount=-CUT_EXTRUDE6_REACH, mode=Mode.PRIVATE) & part.part
    add(cut_extrude6_tool1.solids().sort_by_distance((0, 3, 90))[0], mode=Mode.SUBTRACT)
    add(cut_extrude6_tool2.solids().sort_by_distance((25, 3, 90))[0], mode=Mode.SUBTRACT)


solid = part.part
